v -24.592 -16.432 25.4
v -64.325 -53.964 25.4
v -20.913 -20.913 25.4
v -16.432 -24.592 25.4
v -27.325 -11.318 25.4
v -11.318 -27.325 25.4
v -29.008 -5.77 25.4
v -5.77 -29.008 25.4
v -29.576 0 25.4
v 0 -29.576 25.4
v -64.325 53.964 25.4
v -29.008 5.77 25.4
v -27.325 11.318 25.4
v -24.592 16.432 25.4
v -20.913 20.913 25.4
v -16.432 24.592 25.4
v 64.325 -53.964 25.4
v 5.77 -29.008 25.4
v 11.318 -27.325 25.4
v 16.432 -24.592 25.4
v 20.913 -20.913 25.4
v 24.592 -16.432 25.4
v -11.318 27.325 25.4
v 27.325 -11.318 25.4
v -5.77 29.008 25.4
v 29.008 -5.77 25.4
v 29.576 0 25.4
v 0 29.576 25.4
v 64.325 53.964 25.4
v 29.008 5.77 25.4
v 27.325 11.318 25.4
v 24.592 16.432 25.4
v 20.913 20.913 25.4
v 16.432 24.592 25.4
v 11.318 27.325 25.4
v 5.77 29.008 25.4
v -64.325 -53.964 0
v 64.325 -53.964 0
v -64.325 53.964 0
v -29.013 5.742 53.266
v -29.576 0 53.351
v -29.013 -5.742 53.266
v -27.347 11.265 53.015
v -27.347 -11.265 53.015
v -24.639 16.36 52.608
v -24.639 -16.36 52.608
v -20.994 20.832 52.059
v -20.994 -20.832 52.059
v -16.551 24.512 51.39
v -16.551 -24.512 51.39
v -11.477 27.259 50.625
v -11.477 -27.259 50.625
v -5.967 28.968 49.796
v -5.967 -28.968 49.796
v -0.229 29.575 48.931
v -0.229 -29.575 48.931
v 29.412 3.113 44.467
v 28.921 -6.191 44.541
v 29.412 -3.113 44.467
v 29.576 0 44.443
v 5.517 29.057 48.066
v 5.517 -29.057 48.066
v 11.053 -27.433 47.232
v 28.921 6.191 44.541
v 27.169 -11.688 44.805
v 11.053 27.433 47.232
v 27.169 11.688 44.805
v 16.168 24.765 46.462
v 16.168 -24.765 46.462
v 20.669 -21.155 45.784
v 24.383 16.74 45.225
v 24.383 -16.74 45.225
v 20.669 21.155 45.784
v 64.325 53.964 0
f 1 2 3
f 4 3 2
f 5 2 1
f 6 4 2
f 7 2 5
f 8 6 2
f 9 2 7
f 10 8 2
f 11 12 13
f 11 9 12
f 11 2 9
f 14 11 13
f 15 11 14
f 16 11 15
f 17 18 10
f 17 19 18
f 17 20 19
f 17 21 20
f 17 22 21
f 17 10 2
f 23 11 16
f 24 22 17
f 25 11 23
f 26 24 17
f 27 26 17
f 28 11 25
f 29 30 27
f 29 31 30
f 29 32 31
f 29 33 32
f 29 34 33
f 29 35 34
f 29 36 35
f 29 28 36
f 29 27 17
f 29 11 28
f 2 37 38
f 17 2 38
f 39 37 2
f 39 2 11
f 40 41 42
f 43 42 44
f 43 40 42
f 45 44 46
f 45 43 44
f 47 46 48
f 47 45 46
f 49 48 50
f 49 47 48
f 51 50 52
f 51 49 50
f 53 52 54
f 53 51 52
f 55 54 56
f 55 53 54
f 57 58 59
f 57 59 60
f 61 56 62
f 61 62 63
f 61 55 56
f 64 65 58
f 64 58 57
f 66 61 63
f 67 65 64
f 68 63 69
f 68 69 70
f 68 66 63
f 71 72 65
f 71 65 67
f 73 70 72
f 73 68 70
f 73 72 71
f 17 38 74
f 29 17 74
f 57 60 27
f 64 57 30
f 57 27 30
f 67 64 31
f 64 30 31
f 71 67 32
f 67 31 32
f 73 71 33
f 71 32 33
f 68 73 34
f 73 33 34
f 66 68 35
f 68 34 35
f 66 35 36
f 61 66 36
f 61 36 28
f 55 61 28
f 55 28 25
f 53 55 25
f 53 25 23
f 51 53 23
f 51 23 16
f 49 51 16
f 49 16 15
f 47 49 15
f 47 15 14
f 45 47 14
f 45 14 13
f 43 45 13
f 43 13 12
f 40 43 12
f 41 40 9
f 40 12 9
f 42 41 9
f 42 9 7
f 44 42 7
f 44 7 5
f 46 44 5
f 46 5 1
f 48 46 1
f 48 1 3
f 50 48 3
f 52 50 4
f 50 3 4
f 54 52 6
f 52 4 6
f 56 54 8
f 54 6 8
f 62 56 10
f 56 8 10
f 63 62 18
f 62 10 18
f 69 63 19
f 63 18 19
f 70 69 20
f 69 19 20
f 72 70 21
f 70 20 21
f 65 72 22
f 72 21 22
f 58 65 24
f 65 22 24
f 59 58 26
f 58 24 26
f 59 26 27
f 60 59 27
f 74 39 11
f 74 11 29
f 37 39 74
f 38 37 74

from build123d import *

# Parameters (mm, degrees)
F0_W     = 128.64919
F0_H     = 107.927158
F1_DEPTH = 25.4
F3_R     = 29.576155
F4_DEPTH = 36.322
F6_DEPTH = 38.1
F7_DEPTH = 62.992


with BuildPart() as f1:
    # F0 (on Top) → F1 (new body)
    with BuildSketch(Plane.XY):
        Rectangle(F0_W, F0_H)
    extrude(amount=F1_DEPTH)

    # F3 (on face) → F4 (join)
    with BuildSketch(Plane.XY.offset(25.4)):
        Circle(F3_R)
    extrude(amount=F4_DEPTH)

    # F5 (on Front) → F6 (cut)
    with BuildSketch(Plane.XZ):
        Polygon((-54.256331, 60.477722), (-46.154052, 55.84785), (49.91582, 41.379493), (30.238859, 72.631143), align=None)
    extrude(amount=-F6_DEPTH, mode=Mode.SUBTRACT)

    # F5 (on Front) → F7 (cut)
    with BuildSketch(Plane.XZ):
        Polygon((-54.256331, 60.477722), (-46.154052, 55.84785), (49.91582, 41.379493), (30.238859, 72.631143), align=None)
    extrude(amount=F7_DEPTH, mode=Mode.SUBTRACT)


solid = f1.part
